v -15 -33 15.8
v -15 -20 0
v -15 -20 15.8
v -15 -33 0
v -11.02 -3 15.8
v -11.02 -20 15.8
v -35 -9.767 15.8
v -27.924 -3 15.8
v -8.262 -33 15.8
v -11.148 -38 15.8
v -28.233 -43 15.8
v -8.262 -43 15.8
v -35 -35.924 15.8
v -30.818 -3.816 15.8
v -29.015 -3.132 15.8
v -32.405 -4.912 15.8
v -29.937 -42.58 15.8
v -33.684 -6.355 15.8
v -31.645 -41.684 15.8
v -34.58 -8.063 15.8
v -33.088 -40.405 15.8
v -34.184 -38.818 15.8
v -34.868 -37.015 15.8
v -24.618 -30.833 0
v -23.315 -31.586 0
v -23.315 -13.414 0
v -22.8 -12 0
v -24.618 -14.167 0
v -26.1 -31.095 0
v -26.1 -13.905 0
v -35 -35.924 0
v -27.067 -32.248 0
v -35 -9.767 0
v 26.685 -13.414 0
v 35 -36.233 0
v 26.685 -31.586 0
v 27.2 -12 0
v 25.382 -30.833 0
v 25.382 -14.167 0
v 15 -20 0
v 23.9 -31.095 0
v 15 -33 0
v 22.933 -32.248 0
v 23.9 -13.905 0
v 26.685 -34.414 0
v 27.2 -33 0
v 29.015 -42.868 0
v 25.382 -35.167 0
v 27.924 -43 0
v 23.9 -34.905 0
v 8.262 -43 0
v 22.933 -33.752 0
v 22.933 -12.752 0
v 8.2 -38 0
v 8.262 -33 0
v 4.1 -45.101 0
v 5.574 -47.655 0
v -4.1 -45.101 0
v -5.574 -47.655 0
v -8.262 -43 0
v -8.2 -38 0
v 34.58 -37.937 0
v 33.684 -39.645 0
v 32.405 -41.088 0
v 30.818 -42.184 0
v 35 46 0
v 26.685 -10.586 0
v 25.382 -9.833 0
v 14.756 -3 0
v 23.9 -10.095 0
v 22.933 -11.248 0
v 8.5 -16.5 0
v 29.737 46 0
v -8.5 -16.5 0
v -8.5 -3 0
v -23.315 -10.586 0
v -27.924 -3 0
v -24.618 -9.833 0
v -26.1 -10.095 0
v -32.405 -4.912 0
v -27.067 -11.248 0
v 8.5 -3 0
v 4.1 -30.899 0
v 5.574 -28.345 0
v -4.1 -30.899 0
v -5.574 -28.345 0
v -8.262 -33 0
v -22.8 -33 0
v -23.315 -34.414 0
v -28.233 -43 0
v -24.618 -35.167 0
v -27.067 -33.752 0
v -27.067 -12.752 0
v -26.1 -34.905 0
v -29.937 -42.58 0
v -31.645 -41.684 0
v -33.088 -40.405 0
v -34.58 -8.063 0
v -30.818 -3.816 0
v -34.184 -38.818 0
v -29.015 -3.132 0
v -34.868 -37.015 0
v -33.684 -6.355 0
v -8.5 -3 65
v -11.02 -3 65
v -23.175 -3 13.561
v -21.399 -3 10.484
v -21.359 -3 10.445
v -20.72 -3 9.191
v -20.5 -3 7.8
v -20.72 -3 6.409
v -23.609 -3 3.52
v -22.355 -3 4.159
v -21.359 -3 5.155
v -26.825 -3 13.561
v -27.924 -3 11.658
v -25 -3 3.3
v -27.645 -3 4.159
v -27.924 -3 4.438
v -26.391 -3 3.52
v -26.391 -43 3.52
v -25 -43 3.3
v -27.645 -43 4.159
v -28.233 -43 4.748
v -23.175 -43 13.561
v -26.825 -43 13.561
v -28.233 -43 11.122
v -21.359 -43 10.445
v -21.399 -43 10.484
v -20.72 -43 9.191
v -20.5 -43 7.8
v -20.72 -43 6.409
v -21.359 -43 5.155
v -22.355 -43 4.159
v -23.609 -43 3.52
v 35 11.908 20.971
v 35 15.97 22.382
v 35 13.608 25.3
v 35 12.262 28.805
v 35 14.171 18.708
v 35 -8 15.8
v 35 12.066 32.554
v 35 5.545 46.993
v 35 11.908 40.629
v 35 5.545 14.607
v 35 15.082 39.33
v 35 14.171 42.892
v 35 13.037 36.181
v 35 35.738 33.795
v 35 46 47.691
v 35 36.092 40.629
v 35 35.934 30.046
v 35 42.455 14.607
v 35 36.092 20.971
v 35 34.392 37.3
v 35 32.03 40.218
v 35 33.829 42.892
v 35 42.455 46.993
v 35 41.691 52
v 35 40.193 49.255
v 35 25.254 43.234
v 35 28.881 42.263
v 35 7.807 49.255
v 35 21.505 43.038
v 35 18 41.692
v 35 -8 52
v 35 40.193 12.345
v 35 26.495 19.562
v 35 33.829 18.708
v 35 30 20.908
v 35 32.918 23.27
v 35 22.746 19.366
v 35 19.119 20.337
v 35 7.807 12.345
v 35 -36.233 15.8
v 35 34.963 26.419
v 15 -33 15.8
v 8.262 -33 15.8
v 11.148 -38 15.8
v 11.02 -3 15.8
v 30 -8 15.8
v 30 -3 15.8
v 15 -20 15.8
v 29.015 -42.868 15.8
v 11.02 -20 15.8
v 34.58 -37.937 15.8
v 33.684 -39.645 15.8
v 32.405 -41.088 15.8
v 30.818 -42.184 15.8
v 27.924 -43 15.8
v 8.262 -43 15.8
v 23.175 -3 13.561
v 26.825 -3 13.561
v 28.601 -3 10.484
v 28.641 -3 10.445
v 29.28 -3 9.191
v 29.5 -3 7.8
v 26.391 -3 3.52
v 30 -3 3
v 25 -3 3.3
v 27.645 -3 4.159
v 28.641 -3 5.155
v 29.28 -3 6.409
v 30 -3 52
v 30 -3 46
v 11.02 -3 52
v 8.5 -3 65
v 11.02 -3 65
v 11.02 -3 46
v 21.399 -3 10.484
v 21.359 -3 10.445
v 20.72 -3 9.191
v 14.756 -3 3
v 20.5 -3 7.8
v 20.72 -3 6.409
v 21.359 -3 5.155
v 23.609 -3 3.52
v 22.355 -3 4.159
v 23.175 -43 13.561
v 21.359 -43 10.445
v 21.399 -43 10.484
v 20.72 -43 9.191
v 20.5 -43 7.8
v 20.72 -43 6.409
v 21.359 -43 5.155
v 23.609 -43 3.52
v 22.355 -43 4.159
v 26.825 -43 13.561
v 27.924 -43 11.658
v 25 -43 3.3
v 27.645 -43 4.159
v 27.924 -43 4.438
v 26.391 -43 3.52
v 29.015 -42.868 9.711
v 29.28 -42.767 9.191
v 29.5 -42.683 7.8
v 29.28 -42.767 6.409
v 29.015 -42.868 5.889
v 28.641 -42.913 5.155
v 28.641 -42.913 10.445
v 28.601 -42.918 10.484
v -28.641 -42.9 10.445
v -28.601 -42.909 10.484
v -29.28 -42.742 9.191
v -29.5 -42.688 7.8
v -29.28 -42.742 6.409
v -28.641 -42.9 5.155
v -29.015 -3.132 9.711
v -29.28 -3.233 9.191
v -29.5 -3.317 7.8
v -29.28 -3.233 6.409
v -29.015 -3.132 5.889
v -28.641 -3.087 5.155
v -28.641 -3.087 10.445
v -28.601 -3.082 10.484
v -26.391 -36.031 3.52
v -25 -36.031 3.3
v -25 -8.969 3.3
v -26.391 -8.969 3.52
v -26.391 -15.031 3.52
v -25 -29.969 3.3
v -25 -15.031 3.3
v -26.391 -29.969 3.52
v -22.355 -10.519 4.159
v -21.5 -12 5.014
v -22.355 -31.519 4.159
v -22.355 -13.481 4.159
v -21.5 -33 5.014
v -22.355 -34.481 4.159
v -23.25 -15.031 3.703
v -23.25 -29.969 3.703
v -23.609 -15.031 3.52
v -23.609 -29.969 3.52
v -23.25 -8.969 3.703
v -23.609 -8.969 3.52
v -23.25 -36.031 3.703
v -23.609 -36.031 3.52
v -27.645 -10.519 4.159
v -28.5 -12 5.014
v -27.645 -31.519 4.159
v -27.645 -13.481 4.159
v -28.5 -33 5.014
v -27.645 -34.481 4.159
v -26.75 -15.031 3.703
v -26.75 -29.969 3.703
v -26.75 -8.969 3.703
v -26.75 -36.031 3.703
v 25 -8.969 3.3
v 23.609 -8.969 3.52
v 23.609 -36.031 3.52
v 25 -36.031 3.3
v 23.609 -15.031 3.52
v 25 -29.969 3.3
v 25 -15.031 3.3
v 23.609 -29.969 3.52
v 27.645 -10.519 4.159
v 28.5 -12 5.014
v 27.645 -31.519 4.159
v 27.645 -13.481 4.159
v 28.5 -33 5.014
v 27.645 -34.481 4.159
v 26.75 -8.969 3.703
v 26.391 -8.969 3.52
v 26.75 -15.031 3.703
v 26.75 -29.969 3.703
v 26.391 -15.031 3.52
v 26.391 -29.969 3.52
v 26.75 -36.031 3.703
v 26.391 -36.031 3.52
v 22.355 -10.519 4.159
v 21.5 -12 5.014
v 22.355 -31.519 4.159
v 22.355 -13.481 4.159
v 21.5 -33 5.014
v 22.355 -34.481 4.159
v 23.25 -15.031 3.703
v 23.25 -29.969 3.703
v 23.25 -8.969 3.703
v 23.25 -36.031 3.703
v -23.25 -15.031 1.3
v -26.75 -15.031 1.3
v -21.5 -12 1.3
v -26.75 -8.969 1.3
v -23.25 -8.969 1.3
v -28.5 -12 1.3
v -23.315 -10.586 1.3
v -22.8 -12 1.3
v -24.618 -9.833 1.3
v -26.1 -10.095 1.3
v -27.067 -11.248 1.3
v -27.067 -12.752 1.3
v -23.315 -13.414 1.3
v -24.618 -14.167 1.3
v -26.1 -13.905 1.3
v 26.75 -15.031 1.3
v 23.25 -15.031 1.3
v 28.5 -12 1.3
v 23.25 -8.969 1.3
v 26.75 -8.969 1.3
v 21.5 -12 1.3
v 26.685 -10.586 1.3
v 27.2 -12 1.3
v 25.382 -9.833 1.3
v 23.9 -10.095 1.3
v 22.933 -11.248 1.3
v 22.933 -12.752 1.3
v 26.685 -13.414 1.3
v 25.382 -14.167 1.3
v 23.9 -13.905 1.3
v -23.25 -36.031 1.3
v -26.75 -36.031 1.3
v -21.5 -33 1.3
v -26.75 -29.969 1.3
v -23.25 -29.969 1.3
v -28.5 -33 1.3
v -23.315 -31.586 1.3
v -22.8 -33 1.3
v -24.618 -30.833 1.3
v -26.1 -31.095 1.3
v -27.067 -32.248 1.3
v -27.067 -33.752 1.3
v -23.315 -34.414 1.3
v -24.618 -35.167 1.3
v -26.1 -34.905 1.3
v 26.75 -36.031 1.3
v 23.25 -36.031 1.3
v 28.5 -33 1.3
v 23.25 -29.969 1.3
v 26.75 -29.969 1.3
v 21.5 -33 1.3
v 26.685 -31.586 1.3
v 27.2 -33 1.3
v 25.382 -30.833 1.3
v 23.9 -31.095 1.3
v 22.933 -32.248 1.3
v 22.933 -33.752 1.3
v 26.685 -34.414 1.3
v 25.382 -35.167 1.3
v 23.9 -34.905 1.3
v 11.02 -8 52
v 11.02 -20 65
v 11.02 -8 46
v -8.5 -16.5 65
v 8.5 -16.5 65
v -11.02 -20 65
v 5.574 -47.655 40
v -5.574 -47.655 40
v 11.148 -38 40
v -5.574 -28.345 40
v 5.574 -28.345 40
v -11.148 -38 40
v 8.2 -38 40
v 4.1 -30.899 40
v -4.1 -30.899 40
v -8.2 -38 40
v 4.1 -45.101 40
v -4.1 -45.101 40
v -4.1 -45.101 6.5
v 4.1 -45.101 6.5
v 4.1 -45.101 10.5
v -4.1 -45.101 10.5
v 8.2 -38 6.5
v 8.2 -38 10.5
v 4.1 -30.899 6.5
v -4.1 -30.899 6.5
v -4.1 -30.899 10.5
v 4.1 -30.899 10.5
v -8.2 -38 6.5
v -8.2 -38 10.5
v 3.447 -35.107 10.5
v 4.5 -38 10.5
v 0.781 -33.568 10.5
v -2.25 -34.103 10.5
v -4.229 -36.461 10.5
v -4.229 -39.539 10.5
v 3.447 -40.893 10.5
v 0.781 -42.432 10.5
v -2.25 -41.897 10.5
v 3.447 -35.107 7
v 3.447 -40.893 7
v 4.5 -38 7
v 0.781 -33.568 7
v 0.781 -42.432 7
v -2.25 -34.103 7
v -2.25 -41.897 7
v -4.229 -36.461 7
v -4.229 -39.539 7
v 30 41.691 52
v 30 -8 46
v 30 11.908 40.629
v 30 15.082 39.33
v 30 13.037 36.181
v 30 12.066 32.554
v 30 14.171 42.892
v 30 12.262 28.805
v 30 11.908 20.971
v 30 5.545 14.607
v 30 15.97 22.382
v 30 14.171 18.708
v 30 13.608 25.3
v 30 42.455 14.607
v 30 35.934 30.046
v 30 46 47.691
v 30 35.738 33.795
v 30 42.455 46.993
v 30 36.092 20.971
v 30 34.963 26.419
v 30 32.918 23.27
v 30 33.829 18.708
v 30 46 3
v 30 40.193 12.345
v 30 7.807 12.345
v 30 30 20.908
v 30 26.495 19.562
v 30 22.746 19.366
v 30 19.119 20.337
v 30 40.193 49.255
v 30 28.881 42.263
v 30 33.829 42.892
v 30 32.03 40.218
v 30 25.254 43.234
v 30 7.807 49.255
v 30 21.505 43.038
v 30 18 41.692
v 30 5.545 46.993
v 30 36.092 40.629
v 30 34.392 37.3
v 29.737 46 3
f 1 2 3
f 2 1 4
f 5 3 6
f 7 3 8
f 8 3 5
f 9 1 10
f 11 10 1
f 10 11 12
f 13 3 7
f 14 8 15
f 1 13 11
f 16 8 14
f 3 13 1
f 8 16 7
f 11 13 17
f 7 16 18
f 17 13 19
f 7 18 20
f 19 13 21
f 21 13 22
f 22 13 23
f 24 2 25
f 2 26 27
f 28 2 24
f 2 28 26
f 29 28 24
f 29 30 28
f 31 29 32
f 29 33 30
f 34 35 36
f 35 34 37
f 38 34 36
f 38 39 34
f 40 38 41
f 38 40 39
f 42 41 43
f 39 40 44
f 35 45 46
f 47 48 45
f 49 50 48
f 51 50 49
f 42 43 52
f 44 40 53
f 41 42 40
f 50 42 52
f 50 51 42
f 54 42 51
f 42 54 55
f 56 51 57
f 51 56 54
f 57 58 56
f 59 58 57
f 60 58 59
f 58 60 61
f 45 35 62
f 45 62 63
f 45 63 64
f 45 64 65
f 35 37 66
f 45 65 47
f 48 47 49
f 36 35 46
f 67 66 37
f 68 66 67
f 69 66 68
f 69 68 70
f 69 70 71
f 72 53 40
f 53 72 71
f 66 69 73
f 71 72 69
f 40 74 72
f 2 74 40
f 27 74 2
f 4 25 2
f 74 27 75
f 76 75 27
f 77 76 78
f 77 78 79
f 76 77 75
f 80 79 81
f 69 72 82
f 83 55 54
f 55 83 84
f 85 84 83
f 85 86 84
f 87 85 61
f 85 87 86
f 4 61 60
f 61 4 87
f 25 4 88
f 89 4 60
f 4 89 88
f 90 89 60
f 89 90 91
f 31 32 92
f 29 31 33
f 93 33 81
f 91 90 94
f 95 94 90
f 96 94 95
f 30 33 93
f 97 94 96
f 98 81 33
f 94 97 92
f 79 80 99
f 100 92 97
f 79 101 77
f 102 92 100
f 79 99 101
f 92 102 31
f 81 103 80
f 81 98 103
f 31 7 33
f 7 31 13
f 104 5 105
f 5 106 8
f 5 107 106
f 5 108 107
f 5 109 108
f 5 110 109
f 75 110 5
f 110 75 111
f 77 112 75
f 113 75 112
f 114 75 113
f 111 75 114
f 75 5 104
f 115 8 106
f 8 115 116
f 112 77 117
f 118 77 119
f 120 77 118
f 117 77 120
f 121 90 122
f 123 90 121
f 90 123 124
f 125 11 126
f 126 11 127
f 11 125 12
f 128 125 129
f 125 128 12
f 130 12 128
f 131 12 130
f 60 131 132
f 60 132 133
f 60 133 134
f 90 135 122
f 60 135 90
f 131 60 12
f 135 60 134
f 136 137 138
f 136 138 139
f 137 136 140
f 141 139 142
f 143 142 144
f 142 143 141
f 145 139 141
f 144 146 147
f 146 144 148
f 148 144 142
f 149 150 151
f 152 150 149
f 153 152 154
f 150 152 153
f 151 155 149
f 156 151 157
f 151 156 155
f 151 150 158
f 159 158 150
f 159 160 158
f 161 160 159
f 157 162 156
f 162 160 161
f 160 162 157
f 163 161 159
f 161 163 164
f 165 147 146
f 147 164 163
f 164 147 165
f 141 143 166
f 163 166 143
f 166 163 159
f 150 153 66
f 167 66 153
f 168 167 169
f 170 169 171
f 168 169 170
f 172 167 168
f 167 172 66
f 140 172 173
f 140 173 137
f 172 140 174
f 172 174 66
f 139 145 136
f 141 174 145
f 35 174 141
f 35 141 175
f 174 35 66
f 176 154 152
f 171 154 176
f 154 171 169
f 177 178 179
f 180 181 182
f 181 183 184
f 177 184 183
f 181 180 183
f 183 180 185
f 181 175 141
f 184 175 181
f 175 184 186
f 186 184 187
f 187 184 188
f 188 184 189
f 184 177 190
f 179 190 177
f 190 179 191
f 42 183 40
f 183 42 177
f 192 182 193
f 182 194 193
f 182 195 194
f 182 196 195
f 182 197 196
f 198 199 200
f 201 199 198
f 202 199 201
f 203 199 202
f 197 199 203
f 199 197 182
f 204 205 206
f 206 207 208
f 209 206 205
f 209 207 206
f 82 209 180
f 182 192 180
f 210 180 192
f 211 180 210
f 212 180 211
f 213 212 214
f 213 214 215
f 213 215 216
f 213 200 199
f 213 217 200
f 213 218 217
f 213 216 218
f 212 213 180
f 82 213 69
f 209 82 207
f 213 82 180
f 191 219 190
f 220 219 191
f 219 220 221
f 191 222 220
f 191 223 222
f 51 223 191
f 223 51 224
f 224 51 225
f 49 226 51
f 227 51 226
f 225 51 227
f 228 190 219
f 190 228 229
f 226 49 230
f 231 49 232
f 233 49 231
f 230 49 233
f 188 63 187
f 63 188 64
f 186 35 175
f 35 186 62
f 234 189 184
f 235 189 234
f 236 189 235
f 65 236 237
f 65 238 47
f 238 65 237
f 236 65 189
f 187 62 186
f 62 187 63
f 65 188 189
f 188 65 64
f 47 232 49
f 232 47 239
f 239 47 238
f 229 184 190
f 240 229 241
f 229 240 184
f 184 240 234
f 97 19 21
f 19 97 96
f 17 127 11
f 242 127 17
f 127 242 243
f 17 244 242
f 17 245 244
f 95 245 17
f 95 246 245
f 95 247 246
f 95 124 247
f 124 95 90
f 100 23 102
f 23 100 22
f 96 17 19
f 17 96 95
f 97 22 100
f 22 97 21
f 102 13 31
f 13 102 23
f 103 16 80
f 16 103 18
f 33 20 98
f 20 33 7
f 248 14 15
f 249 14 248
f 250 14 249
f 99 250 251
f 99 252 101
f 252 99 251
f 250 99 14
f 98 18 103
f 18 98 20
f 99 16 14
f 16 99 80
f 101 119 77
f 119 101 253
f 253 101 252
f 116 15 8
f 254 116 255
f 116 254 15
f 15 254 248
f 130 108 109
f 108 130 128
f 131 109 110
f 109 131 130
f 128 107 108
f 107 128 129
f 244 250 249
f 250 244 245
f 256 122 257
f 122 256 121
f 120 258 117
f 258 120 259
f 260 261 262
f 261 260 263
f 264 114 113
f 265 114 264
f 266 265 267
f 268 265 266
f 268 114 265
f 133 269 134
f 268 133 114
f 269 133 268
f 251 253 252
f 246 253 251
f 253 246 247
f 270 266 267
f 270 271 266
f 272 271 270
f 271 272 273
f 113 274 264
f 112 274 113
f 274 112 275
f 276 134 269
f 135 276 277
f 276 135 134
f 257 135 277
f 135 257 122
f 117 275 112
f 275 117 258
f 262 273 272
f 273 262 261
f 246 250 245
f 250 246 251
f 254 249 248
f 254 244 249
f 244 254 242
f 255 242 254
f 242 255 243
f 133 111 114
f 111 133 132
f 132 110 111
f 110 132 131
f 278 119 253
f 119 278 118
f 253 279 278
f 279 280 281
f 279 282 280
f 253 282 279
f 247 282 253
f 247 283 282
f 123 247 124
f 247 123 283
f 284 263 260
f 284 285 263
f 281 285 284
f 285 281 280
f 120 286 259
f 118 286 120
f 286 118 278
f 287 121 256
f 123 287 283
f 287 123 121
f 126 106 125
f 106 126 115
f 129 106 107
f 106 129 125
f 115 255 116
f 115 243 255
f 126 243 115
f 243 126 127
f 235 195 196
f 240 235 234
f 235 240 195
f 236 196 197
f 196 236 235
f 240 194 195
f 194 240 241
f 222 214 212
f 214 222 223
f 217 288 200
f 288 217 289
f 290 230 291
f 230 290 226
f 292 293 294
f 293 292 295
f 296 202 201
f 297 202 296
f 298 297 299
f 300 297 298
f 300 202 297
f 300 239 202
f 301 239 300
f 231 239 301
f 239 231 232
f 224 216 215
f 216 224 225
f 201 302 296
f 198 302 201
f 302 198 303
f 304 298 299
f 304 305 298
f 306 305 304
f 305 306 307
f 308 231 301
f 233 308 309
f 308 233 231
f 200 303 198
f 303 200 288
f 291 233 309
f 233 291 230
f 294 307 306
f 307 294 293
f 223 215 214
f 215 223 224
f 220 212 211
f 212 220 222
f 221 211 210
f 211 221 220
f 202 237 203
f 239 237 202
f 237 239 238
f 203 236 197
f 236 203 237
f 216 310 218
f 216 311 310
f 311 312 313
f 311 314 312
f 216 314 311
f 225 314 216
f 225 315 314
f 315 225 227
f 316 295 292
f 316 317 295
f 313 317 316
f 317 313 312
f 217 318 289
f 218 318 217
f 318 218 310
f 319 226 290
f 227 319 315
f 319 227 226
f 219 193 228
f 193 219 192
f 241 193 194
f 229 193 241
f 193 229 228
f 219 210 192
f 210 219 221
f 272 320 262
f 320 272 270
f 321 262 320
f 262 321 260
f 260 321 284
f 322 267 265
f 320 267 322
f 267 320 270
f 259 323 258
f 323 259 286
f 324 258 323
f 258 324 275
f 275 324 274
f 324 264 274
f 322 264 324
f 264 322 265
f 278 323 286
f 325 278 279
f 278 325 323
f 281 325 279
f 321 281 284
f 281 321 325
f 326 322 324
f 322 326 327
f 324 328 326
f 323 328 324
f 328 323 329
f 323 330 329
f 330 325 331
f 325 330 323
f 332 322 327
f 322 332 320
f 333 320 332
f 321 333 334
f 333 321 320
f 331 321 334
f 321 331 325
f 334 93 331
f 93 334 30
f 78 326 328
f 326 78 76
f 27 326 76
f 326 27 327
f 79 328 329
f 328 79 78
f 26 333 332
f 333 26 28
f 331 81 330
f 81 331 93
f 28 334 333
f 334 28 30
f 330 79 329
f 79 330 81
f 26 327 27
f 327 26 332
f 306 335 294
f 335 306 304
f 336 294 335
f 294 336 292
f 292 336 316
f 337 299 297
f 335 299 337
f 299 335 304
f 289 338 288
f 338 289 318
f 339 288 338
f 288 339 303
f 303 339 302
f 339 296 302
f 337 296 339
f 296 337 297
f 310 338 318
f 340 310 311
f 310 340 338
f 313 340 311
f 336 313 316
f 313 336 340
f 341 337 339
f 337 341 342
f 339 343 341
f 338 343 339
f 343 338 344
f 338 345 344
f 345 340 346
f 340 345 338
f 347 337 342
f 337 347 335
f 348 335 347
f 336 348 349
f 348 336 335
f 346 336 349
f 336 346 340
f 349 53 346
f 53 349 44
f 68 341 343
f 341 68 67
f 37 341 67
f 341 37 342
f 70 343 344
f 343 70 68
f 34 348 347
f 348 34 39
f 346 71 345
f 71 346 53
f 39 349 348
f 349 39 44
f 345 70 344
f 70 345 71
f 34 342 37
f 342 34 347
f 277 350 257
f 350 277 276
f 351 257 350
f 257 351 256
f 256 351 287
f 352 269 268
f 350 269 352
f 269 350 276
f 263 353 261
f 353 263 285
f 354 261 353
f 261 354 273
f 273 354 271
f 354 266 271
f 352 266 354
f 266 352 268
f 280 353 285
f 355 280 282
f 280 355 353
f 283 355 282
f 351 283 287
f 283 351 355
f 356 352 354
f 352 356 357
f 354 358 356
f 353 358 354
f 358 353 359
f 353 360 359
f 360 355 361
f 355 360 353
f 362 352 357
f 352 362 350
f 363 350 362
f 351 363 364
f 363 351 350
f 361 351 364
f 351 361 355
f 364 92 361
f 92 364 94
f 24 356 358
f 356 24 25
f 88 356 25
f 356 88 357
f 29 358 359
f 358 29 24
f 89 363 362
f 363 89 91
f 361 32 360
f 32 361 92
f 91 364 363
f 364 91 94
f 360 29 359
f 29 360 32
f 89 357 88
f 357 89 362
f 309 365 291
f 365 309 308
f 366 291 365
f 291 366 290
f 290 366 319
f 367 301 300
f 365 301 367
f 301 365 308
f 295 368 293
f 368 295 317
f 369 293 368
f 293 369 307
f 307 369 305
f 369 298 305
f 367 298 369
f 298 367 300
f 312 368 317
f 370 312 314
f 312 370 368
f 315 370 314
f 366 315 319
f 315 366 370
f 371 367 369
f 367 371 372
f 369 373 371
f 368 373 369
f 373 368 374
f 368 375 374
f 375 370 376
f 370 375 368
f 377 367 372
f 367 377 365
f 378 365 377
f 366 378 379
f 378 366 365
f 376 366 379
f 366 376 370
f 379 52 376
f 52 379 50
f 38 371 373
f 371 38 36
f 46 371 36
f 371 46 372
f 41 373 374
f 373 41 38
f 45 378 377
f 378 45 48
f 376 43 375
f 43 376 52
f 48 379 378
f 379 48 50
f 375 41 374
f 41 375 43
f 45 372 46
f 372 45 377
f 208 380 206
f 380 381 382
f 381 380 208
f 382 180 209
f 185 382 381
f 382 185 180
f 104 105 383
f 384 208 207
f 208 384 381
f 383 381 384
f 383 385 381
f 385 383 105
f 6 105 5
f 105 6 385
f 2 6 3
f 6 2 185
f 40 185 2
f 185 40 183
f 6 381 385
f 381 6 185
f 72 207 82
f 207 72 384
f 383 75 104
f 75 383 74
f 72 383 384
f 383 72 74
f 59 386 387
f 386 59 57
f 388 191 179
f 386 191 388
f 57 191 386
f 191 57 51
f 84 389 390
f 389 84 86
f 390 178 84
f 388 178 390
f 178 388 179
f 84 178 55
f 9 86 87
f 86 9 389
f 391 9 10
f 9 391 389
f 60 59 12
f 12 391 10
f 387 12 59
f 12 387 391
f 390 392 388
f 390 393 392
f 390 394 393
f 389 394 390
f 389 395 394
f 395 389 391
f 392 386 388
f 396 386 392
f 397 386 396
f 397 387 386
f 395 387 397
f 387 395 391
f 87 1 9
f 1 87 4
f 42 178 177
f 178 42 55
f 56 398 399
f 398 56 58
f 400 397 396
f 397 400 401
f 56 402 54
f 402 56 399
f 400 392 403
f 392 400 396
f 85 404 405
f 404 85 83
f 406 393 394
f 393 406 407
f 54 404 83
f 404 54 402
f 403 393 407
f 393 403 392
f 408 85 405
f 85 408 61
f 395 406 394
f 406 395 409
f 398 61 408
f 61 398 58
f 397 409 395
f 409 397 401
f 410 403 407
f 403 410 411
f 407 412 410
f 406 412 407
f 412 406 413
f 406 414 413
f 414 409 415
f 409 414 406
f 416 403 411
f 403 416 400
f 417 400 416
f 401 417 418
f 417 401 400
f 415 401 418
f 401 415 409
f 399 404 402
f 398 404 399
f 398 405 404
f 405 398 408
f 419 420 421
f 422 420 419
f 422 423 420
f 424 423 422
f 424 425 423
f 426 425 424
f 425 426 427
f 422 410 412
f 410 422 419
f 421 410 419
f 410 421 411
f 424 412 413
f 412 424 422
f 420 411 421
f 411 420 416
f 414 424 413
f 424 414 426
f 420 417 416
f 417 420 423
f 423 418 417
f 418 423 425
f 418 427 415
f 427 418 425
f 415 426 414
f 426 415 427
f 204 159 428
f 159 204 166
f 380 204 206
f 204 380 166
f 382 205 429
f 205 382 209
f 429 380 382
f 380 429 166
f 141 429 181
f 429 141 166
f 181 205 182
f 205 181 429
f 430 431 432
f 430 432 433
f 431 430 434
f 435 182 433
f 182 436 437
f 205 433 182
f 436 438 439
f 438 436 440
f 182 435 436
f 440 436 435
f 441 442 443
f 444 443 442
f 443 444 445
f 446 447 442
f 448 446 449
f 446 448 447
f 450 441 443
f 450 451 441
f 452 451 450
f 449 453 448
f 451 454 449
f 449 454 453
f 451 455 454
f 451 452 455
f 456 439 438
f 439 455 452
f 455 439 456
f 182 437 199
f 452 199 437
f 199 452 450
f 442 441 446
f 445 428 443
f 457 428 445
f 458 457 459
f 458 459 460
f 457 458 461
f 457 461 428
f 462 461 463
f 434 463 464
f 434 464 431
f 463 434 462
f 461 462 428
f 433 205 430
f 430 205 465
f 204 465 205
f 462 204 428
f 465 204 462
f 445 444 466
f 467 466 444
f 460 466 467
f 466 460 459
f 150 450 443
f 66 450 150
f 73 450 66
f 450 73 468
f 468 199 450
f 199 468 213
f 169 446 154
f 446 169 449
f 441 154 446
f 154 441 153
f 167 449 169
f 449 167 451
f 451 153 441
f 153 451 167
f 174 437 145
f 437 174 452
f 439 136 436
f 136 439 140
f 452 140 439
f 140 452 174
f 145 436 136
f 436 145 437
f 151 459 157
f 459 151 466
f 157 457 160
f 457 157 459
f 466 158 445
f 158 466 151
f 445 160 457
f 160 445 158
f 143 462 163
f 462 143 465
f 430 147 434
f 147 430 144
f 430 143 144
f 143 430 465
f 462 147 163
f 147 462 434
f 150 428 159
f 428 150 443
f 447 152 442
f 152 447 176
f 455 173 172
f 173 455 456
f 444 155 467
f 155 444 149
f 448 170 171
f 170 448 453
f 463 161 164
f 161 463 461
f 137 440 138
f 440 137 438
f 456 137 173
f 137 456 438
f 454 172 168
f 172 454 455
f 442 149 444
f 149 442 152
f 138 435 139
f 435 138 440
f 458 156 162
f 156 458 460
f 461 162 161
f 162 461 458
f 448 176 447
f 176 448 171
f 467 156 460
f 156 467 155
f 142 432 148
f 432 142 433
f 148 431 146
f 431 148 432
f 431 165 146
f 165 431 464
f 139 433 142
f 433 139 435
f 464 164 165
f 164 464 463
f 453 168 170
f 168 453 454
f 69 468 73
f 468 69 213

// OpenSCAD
// file: configuration.scad
// PRUSA Mendel  
// Configuration file
// GNU GPL v2
// Josef Pra
// josefprusa@me.com
// prusadjs.cz
// http://www.reprap.org/wiki/Prusa_Mendel
// http://github.com/prusajr/PrusaMendel


// PLEASE SELECT ONE OF THE CONFIGURATIONS BELOW
// BY UN-COMMENTING IT


variant=0; //0 for metric
//variant=1; //1 for SAE
if(variant==0){
echo("variant: metric");
}else if(variant==1){
echo("variant: sae");
} else{
echo("WARNING: INVALID CONFIGURATION");
}




vars=[
//[m8_dia, m8_nut, m4_dia, m4_nut, m3_dia, m3_nut, bush_dia, mot_shaft, bush_rod, bush_outerdia, bush_length]
[9,16.4,5,9,4.4,7,11,5.3,8,16,11],//metric
[9,15.7,5.5,10.6,5.5,10.6,11.5,5.3,7.9375,16,11]//SAE
];


//BUSHING TYPE Can generate three versions
// 1 - regular old ones
// 2 - helical ones
// 3 - holders for brass or any other bought bushings
bushing_type = 2;


//Round corner diameter
round_corner_diameter = 8;


//Thin wall size
layer_height = 0.4;
perimeter_width_over_thicknes = 1.6;
infill_widht_over_thickness = 1.55;
thin_wall = 2*(perimeter_width_over_thicknes*layer_height+infill_widht_over_thickness*layer_height);
if(thin_wall<2){
	echo("Check thin wall size, its below 2mm!");
}
echo(thin_wall);


//DO NOT TOUCH THIS SECTION!
m8_diameter = vars[variant][0];
m8_nut_diameter = vars[variant][1];
m4_diameter = vars[variant][2];
m4_nut_diameter = vars[variant][3];
m3_diameter = vars[variant][4];
m3_nut_diameter = vars[variant][5];
bushing_diameter = vars[variant][6];
motor_shaft=vars[variant][7];
bushing_rodsize = vars[variant][8];
bushing_outerDiameter = vars[variant][9];
bushing_lenght = vars[variant][10];




// MINI-HUXLEY VERSION (TODO, just place holder)
// include <configuration-huxley.scad>


// MEGA VERSION (TODO, just place holder)
// include <configuration-mega.scad>




// Some basic functions, probably should be somewhere else
module roundcorner(diameter){
	difference(){
		cube(size = [diameter,diameter,99], center = false);
		translate(v = [diameter, diameter, 0]) cylinder(h = 100, r=diameter, center=true);
	}
}
// main file
// PRUSA Mendel 
// X-end with NEMA 17 motor mount
// GNU GPL v2
// Josef Pra
// josefprusa@me.com
// prusadjs.cz
// http://www.reprap.org/wiki/Prusa_Mendel
// http://github.com/prusajr/PrusaMendel


include <configuration.scad>
corection = 1.17; 


/**
 * @id x-end-motor
 * @name X end motor
 * @category Printed
 * @using 2 bushing
 * @using 8 m3x10
 * @using 4 m3nut
 * @using 4 m3washer
 * @using 1 m8spring
 * @using 2 m8nut
 */




module xendmotor(){
translate(v = [0,17,24.5]) union(){
difference(){
union(){
//translate(v = [0, -25, 0]) cube(size = [70,70,5], center = true);
translate(v = [-25, -40, -16.6])cube(size = [20,40,15.8], center = true);
translate(v = [25, -40, -16.6])cube(size = [20,40,15.8], center = true);
}




//nut traps


translate(v = [-25, -29, -19.7]) cylinder(h = 7, r=m3_nut_diameter/2, $fn=6, center=true);
translate(v = [-25, -29, -20]) cylinder(h = 10, r=m3_diameter/2, $fn=9, center=true);
translate(v = [25, -29, -19.7]) cylinder(h = 7, r=m3_nut_diameter/2, $fn=6, center=true);
translate(v = [25, -29, -20]) cylinder(h = 10, r=m3_diameter/2, $fn=9, center=true);


translate(v = [-25, -50, -19.7]) cylinder(h = 7, r=m3_nut_diameter/2, $fn=6, center=true);
translate(v = [-25, -50, -20]) cylinder(h = 10, r=m3_diameter/2, $fn=9, center=true);
translate(v = [25, -50, -19.7]) cylinder(h = 7, r=m3_nut_diameter/2, $fn=6, center=true);
translate(v = [25, -50, -20]) cylinder(h = 10, r=m3_diameter/2, $fn=9, center=true);


//round corners
translate(v = [35.1, -60.1, -25]) rotate(a=[0,0,90]) roundcorner(round_corner_diameter);
translate(v = [-35.1, -60.1, -25]) rotate(a=[0,0,0]) roundcorner(round_corner_diameter);
translate(v = [-35.1, -19.9, -25]) rotate(a=[0,0,-90]) roundcorner(round_corner_diameter);


//holes for axis
translate(v = [-25, -18-22, -16.7]) rotate(a=[90,0,0]) {
cylinder(h = 42, r=4.5, $fn=20, center=true);
translate(v = [0, 2.60, 0]) cylinder(h = 42, r=3.65, $fn=6, center=true);
}
translate(v = [25, -18-22, -16.7]) rotate(a=[90,0,0]) {
cylinder(h = 42, r=4.5, $fn=20, center=true);
translate(v = [0, 2.60, 0]) cylinder(h = 42, r=3.65, $fn=6, center=true);
}
//slider cutouts
translate(v = [0, -25, 15]) 
difference(){
translate(v = [0, -0, -14.5])cube(size = [23,23,50], center = true);
}
//nut trap
translate(v = [0, -55, 15]) {
difference(){
translate(v = [0, -0, -15])cylinder(h = 50, r=m8_nut_diameter/2+thin_wall, $fn=6, center=true);
}
}
}


//slider
translate(v = [0, -25, 15]) 
difference(){
union(){
translate(v = [0, -3.5, -7]) cube(size = [17+2*thin_wall,17,65], center = true);


translate(v = [0, -3.5, -31.6]) cube(size = [33,17,15.8], center = true);}
translate(v = [0, -0, -7])cube(size = [17,17,70], center = true);}


//nut trap
translate(v = [0, -55, 15]) {
difference(){
union(){difference(){
union(){
translate(v = [0, -0, -19.5])cylinder(h = 40, r=m8_nut_diameter/2+thin_wall*corection, $fn=6, center=true);
translate(v = [0, 0, -31.6]) cube(size = [35,10,15.8], center = true);}
cylinder(h = 90, r=m8_nut_diameter/2, $fn=6, center=true);
}
translate(v = [0, 0, -31]) cylinder(h = 4, r=m8_nut_diameter/2+thin_wall, $fn=6, center=true);}
translate(v = [0, 0, 12.5]) cylinder(h = 90, r=m8_diameter/2, $fn=9, center=true);
}
}




//nema17 connector
translate(v = [0, 0, -12]) difference(){
union(){
translate(v = [21, -22.5, 36.5]) cube(size = [24,5,6], center = true);
translate(v = [32.5, 2, 13.5]) cube(size = [5,54,52], center = true);
translate(v = [22.5, 2, -11]) cube(size = [20,54,3], center = true);}


// some reduction of bottom part 
translate(v = [15, 15, -11]) rotate ([0,0,-17]) cube(size = [20,70,25], center = true);


translate(v = [0, 0, -4.7]){
translate(v = [32.5, 7, 23.5]) rotate(a=[0,90,0]) rotate(a=[0,0,30]) cylinder(h = 10, r=12, $fn=20, center=true);


translate(v = [30, 7, 23]) rotate(a=[0,90,0]){rotate ([0,0,45]) translate([20,0,0]) cube(size = [9,3.2,25], center = true);
rotate ([0,0,-45]) translate([20,0,0]) cube(size = [9,3.2,25], center = true);
rotate ([0,0,135]) translate([20,0,0]) cube(size = [9,3.2,25], center = true);
rotate ([0,0,-135]) translate([20,0,0]) cube(size = [9,3.2,25], center = true);


rotate ([0,0,135]) translate([32,0,0]) cube(size = [9,20,25], center = true);
}
}
}}
}
xendmotor();
